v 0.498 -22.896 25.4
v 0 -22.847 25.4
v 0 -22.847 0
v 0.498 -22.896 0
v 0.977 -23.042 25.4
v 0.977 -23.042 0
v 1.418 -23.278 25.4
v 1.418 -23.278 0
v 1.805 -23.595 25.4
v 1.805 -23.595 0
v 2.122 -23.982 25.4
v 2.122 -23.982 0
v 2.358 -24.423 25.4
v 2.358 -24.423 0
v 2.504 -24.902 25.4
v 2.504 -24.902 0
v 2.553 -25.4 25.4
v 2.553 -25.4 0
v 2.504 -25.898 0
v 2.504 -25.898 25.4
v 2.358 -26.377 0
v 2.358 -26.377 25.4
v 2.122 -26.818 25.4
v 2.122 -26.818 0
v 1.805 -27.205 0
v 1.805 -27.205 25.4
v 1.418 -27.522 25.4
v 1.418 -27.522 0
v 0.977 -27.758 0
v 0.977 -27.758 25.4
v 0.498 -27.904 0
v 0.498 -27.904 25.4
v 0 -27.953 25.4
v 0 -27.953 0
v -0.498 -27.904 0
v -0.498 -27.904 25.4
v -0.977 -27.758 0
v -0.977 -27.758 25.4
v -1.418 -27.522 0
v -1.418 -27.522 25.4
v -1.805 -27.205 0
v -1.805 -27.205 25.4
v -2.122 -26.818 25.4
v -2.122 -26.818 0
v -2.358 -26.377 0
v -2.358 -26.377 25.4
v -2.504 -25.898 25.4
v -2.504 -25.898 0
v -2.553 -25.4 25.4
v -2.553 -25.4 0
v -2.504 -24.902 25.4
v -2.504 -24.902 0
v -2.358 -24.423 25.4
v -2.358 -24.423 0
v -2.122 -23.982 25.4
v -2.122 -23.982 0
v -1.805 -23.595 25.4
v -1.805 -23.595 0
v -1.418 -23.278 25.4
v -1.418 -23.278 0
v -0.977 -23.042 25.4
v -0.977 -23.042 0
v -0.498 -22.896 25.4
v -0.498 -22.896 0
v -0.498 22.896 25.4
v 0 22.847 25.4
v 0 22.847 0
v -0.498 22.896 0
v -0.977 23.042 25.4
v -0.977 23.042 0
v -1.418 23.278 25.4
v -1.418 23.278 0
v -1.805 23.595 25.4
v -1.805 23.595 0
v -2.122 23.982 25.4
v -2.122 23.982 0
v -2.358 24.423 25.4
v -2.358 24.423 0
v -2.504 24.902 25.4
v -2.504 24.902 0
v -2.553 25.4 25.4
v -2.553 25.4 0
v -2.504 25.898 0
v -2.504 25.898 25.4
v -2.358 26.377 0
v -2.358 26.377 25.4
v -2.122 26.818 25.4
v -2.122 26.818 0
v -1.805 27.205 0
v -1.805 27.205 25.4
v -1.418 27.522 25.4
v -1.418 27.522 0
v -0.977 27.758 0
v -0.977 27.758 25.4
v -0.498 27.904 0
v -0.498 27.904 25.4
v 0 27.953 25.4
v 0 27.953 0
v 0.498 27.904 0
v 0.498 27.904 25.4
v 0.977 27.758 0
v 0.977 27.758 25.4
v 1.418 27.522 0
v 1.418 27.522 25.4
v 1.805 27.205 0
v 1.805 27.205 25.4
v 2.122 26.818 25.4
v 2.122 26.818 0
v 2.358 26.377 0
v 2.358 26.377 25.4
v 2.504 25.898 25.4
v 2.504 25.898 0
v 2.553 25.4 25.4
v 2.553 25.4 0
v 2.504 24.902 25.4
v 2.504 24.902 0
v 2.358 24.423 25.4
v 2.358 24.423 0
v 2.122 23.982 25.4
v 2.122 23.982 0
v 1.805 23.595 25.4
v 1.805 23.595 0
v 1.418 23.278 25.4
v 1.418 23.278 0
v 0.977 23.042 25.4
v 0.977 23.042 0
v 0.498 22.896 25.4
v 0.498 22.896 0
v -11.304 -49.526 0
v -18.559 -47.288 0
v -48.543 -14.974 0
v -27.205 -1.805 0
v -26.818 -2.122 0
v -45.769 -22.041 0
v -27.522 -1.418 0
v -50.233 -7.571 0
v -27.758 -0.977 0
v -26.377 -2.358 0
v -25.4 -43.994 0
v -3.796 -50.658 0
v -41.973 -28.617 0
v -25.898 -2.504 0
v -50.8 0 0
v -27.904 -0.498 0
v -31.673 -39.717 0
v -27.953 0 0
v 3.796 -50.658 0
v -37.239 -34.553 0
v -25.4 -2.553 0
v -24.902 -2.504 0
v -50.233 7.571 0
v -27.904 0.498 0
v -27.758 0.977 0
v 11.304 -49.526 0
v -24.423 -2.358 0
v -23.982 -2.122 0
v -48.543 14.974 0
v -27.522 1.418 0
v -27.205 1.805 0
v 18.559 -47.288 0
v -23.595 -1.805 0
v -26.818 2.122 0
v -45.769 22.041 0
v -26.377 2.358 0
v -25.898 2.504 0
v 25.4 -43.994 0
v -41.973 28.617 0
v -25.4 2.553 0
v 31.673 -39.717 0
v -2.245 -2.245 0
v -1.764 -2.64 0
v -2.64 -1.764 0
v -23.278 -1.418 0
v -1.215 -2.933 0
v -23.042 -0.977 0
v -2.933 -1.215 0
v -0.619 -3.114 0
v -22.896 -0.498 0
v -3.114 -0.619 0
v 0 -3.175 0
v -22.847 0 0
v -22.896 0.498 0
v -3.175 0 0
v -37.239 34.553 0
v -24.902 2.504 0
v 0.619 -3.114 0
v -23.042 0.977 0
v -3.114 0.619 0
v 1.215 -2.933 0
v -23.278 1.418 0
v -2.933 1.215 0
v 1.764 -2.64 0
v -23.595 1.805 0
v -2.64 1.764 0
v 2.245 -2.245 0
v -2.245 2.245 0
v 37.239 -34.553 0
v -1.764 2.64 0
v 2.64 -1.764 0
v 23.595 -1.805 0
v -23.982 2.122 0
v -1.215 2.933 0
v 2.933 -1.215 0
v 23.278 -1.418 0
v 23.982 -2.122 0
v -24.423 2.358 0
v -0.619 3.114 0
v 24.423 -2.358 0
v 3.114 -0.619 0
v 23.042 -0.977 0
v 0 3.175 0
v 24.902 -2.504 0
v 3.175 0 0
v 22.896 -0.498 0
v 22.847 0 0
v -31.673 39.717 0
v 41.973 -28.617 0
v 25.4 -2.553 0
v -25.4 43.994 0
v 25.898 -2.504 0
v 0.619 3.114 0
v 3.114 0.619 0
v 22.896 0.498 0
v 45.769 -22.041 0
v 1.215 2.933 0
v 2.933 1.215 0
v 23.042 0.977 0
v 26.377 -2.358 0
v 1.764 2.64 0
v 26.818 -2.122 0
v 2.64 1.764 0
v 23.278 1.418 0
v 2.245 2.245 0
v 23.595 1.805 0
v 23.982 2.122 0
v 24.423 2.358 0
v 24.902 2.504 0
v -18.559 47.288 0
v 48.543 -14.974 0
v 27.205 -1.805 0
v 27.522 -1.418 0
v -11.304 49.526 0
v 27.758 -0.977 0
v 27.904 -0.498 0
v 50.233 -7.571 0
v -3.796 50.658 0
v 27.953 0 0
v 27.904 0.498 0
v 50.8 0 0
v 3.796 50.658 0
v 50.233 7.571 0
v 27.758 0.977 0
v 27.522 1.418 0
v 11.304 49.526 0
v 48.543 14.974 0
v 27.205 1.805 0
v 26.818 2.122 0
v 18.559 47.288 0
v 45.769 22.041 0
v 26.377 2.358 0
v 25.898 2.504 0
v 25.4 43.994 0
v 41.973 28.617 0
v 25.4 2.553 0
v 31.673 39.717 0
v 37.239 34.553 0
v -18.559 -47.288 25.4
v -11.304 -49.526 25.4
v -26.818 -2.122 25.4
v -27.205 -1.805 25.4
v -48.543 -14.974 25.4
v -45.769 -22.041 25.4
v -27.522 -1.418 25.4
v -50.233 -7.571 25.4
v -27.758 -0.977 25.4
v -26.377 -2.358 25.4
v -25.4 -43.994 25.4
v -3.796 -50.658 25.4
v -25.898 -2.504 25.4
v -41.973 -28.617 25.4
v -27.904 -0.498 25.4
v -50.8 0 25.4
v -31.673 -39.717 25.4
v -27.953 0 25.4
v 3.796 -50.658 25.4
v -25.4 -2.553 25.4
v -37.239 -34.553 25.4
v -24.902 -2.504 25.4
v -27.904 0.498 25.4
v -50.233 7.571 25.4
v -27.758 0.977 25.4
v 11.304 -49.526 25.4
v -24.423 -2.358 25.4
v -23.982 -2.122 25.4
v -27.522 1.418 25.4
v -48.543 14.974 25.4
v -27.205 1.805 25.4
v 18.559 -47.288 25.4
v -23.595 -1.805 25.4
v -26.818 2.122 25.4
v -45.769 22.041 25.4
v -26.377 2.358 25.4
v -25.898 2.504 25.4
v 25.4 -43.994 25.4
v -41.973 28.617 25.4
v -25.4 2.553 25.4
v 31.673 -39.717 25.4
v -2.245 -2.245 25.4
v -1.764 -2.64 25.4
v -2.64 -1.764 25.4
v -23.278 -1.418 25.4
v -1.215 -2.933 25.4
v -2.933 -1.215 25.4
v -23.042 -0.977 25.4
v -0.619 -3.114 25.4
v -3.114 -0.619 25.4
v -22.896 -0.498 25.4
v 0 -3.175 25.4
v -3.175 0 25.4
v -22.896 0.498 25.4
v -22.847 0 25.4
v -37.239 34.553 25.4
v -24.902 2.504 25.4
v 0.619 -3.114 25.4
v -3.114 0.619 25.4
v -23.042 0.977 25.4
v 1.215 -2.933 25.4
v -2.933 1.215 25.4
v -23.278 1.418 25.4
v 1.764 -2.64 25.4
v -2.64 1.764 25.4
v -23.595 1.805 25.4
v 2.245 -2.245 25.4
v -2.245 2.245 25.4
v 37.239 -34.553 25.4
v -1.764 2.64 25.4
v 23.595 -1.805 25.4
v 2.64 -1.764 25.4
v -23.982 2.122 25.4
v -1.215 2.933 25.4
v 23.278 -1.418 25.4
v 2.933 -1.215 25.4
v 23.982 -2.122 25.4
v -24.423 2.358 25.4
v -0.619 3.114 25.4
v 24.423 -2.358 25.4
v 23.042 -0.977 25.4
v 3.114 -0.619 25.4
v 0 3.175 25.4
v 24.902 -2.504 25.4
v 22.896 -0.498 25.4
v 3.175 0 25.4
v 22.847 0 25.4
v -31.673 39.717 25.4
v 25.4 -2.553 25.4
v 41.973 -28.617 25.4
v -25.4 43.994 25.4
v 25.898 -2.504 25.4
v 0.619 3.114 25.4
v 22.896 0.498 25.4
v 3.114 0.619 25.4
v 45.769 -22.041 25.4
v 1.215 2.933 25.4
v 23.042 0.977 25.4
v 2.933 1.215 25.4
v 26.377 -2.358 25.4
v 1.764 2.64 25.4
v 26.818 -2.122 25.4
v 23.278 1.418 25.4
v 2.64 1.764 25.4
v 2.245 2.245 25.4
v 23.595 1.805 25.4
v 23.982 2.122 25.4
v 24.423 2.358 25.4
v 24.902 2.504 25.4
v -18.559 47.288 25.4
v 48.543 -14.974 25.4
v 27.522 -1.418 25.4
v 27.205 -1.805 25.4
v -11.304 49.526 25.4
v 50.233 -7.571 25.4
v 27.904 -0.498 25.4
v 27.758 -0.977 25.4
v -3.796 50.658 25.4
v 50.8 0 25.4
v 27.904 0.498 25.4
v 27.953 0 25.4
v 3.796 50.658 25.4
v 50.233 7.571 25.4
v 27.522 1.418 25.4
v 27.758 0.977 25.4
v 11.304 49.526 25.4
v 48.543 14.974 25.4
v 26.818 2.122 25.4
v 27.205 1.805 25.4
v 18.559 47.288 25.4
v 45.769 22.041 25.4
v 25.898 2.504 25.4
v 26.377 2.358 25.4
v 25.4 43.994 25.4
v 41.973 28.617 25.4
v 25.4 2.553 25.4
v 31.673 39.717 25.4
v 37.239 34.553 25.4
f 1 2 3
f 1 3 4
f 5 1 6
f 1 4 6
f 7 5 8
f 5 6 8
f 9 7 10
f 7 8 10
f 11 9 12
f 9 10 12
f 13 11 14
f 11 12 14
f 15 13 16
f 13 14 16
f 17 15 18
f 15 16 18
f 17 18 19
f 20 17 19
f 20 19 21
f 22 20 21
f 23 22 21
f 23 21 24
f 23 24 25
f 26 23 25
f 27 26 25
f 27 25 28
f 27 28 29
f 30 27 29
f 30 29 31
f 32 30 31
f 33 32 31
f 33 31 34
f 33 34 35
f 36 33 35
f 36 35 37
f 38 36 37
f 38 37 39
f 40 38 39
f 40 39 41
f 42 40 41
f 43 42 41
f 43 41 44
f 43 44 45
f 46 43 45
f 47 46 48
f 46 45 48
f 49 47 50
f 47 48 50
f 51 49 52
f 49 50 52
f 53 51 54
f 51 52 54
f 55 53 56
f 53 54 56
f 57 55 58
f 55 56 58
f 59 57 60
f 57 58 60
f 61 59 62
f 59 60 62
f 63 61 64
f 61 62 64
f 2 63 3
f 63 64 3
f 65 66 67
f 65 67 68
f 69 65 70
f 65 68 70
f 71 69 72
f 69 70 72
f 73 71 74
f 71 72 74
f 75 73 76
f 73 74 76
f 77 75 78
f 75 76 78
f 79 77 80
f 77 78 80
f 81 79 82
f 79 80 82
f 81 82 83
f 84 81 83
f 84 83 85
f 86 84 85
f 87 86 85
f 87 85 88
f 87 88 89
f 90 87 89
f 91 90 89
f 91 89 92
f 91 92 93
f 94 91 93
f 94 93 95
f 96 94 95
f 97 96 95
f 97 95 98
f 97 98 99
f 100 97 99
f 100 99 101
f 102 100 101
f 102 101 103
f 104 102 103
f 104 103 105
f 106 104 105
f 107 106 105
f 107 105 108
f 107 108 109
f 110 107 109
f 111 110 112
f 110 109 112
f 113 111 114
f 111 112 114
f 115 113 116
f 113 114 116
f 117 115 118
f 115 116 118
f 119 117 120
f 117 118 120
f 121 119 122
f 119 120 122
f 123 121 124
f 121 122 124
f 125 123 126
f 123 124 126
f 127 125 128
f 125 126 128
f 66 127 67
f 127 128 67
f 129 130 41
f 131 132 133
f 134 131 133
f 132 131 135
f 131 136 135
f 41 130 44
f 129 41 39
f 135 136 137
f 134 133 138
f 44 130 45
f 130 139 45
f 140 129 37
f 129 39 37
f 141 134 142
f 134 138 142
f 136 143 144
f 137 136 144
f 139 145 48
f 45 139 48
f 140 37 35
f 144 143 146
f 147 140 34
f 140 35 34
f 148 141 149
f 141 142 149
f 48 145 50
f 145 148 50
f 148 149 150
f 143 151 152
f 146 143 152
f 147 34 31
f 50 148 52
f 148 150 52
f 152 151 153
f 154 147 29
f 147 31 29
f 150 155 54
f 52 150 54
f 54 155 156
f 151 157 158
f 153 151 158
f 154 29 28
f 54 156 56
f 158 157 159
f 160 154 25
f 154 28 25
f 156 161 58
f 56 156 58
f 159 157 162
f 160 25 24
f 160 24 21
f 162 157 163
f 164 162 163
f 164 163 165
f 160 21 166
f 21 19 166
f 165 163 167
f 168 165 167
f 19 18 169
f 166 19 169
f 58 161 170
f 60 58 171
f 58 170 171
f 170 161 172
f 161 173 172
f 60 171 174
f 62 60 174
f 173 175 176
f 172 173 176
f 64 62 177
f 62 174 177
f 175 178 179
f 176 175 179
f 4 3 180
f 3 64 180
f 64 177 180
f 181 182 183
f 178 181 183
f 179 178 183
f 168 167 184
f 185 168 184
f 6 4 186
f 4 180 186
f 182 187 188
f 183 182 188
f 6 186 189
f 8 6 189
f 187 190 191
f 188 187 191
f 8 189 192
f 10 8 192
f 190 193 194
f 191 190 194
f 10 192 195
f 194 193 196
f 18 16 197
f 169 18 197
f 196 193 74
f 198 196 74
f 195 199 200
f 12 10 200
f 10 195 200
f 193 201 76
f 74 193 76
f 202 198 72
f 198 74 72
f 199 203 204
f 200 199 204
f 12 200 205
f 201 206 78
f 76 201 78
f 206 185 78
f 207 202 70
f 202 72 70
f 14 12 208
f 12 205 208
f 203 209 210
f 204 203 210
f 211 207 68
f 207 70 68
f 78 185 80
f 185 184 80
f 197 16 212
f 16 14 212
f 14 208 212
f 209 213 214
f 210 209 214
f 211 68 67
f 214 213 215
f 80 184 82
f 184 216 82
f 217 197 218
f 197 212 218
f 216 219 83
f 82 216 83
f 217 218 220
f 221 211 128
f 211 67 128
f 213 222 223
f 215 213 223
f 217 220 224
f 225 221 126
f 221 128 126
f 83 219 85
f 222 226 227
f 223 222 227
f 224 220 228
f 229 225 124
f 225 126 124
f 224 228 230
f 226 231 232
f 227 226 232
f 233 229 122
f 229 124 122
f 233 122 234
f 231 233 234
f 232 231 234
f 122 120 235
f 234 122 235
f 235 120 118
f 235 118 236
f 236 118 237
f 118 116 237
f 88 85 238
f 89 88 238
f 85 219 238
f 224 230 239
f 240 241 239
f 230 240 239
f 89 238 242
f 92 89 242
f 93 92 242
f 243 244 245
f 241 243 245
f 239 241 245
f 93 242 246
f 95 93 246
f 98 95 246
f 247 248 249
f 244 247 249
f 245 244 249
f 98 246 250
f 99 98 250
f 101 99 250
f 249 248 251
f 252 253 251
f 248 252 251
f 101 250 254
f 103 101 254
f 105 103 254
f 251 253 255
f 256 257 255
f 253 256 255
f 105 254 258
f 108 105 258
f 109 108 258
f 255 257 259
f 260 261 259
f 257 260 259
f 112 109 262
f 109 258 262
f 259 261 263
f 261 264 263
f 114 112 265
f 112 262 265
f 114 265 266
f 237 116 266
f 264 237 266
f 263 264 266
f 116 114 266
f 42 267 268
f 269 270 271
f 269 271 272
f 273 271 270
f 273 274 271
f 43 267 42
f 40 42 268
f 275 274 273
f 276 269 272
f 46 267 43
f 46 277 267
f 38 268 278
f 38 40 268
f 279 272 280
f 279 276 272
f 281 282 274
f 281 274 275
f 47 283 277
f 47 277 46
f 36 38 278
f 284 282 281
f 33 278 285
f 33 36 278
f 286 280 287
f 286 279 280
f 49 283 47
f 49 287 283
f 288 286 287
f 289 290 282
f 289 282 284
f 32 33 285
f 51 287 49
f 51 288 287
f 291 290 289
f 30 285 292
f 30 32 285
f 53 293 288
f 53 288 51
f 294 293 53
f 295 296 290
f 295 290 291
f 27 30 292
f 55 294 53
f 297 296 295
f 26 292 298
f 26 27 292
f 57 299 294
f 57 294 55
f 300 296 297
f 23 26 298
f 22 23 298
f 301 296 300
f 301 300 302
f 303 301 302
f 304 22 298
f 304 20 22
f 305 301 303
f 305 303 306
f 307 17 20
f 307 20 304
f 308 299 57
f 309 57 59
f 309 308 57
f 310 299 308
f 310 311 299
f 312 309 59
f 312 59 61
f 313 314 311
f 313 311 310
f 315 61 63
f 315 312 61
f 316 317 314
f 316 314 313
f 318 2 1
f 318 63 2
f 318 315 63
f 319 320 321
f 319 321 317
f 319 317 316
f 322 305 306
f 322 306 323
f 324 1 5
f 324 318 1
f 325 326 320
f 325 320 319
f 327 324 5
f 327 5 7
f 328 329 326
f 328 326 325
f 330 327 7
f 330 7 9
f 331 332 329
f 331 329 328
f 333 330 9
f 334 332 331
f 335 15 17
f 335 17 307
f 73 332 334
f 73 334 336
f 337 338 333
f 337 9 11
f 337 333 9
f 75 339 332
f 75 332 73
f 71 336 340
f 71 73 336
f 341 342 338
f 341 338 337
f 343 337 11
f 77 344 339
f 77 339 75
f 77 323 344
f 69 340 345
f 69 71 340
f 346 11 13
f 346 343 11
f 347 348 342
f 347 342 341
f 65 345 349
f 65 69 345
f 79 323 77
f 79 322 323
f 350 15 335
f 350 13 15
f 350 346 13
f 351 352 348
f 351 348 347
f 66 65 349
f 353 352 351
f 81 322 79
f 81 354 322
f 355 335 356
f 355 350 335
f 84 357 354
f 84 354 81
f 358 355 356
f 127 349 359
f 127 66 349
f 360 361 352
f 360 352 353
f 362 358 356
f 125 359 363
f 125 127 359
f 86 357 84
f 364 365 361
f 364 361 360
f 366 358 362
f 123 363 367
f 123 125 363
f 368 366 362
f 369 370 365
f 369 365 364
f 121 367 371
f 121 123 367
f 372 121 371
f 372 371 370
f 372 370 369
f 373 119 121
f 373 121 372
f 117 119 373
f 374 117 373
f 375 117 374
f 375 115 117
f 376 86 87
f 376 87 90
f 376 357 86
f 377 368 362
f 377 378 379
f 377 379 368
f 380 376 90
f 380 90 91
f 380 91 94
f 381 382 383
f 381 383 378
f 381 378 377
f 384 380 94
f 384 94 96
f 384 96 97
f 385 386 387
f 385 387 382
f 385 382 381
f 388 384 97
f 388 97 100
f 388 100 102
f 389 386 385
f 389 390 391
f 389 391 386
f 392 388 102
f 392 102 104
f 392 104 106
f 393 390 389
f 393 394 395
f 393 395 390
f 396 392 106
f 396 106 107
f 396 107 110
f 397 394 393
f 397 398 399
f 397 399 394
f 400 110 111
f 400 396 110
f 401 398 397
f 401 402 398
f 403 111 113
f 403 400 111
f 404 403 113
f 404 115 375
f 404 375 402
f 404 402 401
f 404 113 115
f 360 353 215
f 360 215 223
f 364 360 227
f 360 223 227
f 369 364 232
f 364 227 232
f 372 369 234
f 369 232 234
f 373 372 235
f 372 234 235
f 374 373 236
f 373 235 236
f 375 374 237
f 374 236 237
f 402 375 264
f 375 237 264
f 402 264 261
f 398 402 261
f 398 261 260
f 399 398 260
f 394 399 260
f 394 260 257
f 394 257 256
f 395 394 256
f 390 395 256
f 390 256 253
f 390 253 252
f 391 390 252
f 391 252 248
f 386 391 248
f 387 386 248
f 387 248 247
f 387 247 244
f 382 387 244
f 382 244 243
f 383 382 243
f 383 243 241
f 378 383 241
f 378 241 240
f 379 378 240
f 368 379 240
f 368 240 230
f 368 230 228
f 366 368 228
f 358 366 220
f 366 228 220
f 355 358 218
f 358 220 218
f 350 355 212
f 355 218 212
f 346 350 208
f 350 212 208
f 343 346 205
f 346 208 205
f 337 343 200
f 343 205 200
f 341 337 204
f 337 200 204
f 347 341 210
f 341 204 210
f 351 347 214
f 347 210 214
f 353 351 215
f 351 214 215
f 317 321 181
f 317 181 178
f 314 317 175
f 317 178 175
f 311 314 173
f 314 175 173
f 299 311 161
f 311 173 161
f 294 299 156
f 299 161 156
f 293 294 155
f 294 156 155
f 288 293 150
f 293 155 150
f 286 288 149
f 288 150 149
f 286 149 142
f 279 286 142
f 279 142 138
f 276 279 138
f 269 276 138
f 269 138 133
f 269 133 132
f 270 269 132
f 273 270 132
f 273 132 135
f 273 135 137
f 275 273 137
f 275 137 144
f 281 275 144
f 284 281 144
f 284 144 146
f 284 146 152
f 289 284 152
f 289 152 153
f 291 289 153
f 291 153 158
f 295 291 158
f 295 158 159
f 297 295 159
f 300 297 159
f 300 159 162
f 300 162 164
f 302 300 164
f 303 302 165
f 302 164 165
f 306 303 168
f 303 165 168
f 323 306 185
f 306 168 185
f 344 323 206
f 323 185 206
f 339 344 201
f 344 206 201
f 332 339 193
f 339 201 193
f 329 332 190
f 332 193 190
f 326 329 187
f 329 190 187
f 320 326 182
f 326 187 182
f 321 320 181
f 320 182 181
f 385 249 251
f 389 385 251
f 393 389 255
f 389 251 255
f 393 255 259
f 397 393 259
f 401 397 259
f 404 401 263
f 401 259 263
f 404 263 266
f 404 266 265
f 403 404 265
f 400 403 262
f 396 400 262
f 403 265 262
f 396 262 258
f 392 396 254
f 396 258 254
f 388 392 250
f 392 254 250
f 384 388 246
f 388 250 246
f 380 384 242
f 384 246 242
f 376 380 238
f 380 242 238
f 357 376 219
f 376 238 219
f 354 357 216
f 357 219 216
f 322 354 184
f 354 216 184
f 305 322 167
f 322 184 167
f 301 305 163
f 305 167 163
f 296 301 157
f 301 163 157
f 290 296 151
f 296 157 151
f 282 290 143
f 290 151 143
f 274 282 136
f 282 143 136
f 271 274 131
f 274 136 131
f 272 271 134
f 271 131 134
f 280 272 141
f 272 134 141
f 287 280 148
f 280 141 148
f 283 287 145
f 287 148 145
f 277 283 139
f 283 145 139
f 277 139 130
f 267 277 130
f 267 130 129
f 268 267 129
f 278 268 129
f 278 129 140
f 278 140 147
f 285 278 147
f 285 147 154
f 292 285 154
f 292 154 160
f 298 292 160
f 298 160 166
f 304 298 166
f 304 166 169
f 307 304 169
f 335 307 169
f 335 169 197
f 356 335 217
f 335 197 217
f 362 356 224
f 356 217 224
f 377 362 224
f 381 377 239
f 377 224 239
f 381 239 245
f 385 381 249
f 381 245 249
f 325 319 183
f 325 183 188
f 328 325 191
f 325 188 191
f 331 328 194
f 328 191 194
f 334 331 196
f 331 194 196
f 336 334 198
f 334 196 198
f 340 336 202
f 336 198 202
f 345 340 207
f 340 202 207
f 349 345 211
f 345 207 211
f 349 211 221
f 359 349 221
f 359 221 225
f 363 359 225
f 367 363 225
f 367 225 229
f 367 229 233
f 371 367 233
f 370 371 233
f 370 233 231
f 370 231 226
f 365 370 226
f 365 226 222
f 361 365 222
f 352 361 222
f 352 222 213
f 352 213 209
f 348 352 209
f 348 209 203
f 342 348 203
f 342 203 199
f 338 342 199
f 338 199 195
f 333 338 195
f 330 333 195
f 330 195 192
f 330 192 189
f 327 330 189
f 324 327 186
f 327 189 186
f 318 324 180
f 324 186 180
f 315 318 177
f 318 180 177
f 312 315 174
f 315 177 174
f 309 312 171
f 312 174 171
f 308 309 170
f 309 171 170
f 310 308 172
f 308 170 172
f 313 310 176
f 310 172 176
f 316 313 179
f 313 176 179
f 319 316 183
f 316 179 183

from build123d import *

# Parameters (mm, degrees)
SKETCH1_R                   = 50.8
EXTRUDE1_DEPTH              = 25.4
F_1_4_0_25_DIAMETER_HOLE1_D = 6.35
F_1_4_20_TAPPED_HOLE1_D     = 5.1054
CIRPATTERN1_COUNT           = 4


with BuildPart() as part:
    # Sketch1 → Extrude1 (new body)
    with BuildSketch(Plane.XY):
        Circle(SKETCH1_R)
    extrude(amount=EXTRUDE1_DEPTH)

    # 1/4 (0.25) Diameter Hole1 (through all)
    with Locations(Plane.XY.offset(25.4)):
        with Locations((0, 0)):
            Hole(F_1_4_0_25_DIAMETER_HOLE1_D / 2)

    # 1/4-20 Tapped Hole1 (through all)
    with Locations(Plane(origin=(25.4, 0, 25.4), x_dir=(1, 0, 0), z_dir=(0, 0, 1))):
        with Locations((0, 0)):
            f_1_4_20_tapped_hole1 = Hole(F_1_4_20_TAPPED_HOLE1_D / 2)

    # CirPattern1: 1/4-20 Tapped Hole1 ×4 about axis
    cirpattern1_axis = Axis((0, 0, 0), (0, 0, 1))
    for i in range(1, CIRPATTERN1_COUNT):
        add(f_1_4_20_tapped_hole1.rotate(cirpattern1_axis, i * 360 / CIRPATTERN1_COUNT), mode=Mode.SUBTRACT)


solid = part.part
